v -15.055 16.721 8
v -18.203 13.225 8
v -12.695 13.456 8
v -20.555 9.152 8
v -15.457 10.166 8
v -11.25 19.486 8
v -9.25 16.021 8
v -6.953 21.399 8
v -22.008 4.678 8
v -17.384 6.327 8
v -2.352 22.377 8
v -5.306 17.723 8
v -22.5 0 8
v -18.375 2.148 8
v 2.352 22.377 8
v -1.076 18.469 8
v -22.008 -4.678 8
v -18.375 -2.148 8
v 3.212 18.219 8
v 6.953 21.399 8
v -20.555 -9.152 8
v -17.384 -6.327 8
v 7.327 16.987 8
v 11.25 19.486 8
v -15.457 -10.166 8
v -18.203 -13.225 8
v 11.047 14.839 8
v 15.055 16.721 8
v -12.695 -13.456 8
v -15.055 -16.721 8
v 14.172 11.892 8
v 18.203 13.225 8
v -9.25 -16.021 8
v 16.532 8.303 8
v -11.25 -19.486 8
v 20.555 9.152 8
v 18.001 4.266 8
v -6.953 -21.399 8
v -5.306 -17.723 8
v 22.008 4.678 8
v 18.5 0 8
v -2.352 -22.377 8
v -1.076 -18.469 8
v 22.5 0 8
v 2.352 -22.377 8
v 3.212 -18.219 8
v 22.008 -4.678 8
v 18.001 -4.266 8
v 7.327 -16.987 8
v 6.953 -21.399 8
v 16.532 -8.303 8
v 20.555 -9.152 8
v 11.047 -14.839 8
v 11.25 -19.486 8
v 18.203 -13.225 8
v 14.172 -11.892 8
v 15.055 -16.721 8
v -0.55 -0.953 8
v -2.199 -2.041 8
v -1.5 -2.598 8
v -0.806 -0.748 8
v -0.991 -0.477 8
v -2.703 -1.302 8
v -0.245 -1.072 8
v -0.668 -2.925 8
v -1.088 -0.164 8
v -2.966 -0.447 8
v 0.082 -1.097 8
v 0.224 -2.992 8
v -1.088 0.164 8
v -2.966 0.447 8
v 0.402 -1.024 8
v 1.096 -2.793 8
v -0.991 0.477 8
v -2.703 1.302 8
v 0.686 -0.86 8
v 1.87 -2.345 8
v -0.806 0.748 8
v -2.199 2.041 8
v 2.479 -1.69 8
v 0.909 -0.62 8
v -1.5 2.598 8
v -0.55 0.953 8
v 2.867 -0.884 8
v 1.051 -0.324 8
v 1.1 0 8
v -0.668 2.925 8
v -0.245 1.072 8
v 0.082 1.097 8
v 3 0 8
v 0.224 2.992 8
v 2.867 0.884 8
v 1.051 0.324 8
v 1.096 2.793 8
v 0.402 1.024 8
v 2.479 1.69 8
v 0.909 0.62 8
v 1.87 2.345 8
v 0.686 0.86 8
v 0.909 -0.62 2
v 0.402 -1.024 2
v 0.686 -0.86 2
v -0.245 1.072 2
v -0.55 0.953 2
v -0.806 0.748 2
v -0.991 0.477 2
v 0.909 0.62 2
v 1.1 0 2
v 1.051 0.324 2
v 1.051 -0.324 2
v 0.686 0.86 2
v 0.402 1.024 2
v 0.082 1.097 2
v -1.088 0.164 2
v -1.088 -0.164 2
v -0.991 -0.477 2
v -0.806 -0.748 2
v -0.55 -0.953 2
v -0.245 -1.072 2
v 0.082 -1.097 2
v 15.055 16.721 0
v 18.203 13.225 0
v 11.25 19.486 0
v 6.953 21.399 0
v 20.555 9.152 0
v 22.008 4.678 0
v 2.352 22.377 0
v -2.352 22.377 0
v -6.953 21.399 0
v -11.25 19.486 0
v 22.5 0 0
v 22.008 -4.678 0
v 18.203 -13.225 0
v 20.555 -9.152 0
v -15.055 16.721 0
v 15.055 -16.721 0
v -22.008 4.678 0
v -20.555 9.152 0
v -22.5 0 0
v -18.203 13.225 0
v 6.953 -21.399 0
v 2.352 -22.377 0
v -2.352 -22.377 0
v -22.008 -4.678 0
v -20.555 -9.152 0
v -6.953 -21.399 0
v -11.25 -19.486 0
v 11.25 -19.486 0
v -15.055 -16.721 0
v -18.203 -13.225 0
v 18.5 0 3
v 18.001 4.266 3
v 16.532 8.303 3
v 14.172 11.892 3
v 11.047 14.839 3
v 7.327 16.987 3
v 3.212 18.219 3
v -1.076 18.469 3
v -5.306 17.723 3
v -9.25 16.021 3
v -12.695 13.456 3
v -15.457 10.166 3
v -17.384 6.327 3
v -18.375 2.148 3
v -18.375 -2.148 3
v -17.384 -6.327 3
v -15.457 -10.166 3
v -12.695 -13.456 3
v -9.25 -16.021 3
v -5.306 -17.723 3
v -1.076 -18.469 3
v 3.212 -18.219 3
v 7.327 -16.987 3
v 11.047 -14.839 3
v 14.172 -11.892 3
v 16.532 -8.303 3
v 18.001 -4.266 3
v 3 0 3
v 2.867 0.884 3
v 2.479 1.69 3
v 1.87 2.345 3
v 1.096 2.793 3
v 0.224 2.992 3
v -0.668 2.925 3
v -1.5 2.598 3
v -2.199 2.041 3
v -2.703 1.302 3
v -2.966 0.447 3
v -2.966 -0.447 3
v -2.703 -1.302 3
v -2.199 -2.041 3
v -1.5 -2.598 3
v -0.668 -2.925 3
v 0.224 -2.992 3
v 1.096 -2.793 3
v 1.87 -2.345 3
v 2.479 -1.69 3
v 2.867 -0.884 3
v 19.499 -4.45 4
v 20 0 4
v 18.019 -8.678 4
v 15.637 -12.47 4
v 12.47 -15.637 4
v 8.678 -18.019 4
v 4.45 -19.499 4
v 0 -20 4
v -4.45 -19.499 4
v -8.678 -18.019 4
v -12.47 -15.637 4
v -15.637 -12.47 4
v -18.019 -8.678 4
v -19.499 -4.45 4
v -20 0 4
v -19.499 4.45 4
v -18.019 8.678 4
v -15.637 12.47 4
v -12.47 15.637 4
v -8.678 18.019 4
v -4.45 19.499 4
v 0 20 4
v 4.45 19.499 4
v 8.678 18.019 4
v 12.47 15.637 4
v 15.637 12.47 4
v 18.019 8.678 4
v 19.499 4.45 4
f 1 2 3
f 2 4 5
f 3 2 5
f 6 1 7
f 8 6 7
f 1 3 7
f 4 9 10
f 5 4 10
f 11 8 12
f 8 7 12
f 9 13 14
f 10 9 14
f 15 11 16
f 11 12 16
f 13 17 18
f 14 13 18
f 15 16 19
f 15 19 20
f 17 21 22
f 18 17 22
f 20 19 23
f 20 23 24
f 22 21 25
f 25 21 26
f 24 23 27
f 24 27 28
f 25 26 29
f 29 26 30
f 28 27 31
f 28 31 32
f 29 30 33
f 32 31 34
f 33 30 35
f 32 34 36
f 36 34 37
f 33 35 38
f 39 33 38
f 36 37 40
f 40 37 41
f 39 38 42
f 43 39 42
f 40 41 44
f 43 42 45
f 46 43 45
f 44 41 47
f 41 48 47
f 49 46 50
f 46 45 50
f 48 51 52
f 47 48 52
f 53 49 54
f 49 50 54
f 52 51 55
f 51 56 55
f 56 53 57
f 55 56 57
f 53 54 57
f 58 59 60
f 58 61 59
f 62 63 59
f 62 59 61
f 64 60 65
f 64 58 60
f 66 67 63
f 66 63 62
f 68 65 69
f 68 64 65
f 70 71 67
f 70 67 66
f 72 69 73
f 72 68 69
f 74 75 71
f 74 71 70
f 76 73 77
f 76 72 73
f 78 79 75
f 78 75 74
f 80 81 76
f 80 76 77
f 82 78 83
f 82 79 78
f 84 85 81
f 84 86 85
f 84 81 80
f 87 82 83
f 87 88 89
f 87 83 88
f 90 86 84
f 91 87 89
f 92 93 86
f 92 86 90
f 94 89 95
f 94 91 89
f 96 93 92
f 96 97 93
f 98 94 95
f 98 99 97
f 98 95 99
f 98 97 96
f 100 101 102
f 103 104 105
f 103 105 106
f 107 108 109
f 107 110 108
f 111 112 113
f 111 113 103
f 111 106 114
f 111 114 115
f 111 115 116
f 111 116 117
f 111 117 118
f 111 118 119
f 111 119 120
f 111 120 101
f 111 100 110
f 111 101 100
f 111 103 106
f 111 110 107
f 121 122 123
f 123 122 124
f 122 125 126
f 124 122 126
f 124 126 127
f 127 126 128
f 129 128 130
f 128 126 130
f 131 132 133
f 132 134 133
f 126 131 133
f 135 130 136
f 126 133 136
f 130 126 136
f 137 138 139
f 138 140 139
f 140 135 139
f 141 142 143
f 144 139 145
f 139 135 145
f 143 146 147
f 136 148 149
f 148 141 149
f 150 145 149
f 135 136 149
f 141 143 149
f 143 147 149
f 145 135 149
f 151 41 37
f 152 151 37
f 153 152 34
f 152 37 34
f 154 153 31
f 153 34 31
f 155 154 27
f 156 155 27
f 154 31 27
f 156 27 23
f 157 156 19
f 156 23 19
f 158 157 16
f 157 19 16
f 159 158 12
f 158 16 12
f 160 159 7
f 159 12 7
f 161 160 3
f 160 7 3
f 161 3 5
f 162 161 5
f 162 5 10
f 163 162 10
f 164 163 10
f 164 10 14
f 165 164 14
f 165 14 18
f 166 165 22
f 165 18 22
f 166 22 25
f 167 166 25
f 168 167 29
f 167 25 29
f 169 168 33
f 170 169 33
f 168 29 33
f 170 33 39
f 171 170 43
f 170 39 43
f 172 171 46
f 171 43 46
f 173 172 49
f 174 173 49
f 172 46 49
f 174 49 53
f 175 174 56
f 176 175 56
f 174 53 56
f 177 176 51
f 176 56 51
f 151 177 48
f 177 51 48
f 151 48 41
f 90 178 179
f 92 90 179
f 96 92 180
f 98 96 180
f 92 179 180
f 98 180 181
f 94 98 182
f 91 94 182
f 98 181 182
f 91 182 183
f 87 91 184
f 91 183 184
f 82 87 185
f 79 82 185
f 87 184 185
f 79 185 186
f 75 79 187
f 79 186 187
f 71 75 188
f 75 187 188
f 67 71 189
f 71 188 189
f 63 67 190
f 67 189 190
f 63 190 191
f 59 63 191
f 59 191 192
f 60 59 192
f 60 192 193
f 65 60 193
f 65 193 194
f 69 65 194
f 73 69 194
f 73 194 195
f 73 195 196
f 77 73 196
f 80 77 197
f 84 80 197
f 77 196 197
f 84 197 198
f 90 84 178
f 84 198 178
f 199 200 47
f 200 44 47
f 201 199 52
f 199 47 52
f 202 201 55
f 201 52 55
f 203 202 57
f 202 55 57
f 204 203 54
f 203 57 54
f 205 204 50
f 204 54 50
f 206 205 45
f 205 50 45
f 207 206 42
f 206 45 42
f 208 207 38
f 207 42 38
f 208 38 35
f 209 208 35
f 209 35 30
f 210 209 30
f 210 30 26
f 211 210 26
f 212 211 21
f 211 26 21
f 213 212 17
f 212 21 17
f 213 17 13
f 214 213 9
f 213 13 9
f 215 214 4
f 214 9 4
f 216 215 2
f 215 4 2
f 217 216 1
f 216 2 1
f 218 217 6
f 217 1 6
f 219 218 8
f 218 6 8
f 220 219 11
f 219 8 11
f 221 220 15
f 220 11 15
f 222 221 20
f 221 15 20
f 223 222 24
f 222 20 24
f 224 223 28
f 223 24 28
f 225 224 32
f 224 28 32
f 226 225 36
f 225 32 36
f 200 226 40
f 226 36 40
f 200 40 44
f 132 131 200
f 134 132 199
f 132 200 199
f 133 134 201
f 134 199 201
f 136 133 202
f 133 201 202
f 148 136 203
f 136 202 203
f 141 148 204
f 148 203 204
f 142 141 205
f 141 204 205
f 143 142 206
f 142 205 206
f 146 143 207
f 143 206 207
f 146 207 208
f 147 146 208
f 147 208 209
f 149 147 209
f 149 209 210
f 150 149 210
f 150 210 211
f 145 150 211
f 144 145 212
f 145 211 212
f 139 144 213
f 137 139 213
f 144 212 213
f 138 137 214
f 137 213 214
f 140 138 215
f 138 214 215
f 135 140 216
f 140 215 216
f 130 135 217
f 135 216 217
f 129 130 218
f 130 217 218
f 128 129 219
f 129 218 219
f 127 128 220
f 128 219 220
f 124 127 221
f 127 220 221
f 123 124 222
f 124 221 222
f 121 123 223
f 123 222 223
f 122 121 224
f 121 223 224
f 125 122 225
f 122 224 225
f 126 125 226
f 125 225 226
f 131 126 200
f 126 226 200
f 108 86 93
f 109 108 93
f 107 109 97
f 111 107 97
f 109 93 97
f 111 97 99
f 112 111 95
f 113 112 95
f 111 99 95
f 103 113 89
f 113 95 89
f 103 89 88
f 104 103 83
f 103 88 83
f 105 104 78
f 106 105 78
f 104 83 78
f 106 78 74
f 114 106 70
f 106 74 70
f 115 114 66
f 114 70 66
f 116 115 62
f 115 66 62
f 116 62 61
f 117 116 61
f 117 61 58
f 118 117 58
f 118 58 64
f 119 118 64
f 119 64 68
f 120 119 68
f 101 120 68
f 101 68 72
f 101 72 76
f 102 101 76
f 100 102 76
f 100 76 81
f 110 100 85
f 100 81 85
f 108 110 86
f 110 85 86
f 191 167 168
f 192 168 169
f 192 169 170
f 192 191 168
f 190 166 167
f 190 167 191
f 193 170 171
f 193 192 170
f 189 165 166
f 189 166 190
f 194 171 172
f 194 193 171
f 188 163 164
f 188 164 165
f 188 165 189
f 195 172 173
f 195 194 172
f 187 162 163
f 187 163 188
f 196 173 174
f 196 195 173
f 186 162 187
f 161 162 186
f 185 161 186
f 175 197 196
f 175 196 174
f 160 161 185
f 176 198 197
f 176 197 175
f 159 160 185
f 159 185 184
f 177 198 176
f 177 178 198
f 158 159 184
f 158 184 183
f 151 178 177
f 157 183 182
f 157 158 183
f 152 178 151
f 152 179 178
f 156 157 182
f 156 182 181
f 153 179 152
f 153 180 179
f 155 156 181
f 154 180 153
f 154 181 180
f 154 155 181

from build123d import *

# Parameters (mm, degrees)
F3_R     = 18.5
F4_DEPTH = 5
F5_R     = 3
F6_DEPTH = 5
F7_R     = 1.1
F8_DEPTH = 6


with BuildPart() as f2:
    # F1 (on Front) → F2 (revolve)
    with BuildSketch(Plane.XZ):
        Polygon((0, 8), (0, 0), (22.5, 0), (20, 4), (22.5, 8), align=None)
    revolve(axis=Axis((0, 0, 4), (0, 0, -1)))

    # F3 (on face) → F4 (cut)
    with BuildSketch(Plane.XY.offset(8)):
        Circle(F3_R)
    extrude(amount=-F4_DEPTH, mode=Mode.SUBTRACT)

    # F5 (on face) → F6 (join, through all)
    with BuildSketch(Plane.XY.offset(3)):
        Circle(F5_R)
    extrude(amount=F6_DEPTH)

    # F7 (on face) → F8 (cut)
    with BuildSketch(Plane.XY.offset(8)):
        Circle(F7_R)
    extrude(amount=-F8_DEPTH, mode=Mode.SUBTRACT)


solid = f2.part
